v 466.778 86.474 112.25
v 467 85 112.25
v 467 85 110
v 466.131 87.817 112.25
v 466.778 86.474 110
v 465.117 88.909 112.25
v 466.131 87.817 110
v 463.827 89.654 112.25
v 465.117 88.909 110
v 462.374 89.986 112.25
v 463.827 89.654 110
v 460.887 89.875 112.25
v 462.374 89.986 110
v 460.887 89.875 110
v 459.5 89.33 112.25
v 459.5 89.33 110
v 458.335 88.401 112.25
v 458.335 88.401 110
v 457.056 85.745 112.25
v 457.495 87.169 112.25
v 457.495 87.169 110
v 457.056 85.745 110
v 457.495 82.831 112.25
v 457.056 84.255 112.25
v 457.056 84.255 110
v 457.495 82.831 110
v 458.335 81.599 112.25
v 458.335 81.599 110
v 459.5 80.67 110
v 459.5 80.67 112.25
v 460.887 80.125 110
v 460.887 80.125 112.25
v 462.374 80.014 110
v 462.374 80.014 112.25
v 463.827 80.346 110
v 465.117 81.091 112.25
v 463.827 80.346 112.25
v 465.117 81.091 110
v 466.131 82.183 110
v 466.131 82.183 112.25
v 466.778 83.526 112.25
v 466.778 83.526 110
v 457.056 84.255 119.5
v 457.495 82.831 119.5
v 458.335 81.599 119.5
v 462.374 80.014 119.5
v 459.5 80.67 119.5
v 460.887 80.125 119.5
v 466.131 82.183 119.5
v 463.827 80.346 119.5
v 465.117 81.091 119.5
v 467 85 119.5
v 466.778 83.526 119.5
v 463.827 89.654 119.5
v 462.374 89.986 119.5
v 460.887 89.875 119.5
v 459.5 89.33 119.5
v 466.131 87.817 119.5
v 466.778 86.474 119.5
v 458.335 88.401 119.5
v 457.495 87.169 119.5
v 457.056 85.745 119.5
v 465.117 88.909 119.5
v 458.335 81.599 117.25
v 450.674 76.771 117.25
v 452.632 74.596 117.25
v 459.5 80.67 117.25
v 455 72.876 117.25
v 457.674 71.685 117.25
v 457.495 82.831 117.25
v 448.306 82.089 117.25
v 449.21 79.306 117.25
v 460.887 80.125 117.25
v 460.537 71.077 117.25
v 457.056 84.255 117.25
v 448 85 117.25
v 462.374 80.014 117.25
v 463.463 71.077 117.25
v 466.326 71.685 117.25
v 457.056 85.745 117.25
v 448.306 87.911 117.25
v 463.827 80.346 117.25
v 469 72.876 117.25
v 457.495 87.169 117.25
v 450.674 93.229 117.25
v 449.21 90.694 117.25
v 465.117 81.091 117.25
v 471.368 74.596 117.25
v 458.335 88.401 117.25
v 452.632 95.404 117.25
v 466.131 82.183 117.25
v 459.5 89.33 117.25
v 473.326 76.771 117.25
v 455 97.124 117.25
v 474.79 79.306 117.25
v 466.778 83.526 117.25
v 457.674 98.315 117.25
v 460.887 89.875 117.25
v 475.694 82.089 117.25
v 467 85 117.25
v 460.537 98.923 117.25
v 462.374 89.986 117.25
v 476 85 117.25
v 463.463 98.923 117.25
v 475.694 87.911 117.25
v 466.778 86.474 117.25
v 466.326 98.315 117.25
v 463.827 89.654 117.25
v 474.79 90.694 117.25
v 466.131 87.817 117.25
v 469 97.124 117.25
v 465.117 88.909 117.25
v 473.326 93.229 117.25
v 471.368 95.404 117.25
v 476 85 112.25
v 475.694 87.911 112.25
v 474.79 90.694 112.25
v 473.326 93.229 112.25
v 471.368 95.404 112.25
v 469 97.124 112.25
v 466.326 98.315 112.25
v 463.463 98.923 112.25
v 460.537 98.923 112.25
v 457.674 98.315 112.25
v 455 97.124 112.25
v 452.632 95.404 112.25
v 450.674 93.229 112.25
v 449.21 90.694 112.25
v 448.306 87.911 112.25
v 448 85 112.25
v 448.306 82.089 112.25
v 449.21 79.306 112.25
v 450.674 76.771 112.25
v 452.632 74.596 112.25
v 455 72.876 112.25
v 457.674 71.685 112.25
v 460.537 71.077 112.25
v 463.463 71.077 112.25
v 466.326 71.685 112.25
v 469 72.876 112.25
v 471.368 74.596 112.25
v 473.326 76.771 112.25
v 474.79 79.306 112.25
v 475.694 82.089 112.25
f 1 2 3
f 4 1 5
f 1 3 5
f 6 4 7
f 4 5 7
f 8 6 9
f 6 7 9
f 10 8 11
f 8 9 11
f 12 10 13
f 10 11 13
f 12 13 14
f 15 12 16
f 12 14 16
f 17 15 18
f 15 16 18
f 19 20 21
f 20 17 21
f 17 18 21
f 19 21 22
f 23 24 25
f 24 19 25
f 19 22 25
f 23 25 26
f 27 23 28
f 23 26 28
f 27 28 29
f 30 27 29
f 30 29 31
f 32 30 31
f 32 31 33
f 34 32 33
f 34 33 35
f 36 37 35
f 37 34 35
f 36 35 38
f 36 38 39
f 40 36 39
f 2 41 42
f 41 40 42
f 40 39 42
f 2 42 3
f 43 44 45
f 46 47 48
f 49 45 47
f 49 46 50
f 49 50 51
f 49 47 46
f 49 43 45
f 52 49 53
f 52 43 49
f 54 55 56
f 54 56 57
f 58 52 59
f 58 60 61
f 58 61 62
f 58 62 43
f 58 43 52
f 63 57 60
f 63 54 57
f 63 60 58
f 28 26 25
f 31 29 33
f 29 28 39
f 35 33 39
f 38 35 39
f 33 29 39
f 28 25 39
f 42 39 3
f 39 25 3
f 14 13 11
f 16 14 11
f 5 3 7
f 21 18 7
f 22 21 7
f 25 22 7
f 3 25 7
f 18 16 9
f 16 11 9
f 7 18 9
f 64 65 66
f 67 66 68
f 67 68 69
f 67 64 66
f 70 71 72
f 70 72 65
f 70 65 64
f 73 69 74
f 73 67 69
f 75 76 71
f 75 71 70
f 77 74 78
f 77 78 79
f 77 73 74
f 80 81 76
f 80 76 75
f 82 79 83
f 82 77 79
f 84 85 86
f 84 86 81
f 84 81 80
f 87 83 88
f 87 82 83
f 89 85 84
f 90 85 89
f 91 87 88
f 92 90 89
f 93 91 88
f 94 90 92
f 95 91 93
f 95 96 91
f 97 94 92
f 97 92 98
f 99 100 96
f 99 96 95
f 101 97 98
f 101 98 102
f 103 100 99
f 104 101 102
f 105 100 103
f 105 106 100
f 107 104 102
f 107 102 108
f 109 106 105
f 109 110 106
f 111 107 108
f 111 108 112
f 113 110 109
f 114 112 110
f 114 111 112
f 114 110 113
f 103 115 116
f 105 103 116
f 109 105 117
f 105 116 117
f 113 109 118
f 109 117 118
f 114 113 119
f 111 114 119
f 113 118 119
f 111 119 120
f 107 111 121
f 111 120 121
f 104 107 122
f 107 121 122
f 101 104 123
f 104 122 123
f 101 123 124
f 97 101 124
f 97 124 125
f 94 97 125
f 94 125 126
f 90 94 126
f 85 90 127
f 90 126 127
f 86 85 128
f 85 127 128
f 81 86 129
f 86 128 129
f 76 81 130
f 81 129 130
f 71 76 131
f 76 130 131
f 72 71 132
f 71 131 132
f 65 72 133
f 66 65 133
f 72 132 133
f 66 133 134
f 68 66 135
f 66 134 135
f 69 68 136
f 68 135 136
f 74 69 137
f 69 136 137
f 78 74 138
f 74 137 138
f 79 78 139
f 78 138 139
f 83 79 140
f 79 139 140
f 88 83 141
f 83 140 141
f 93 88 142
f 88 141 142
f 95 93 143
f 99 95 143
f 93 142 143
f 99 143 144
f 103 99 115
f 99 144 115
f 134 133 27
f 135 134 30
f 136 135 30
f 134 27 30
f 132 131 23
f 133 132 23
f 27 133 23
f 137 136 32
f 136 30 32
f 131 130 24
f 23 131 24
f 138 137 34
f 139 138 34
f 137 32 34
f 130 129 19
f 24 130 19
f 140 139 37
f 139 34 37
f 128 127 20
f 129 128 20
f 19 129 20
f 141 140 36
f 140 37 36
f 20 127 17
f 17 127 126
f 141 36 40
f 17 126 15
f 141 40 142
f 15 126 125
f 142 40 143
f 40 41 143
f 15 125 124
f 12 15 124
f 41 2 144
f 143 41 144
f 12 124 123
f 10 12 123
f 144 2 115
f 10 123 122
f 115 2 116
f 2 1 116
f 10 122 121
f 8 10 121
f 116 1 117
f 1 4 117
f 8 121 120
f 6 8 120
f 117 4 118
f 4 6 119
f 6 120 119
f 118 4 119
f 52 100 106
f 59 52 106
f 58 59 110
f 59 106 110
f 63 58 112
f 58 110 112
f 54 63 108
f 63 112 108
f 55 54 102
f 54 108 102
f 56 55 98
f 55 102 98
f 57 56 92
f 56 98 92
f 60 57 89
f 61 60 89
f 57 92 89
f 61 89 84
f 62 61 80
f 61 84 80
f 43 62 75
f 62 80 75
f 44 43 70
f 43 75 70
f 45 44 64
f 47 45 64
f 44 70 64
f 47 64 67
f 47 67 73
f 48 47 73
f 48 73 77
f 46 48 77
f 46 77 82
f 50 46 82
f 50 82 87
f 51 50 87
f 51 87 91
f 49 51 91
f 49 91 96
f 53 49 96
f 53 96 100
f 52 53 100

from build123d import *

# Parameters (mm, degrees)
CYLINDER1201_R     = 5
CYLINDER1201_DEPTH = 9.5
CYLINDER1197_R     = 14
CYLINDER1197_DEPTH = 5


with BuildPart() as cylinder1201:
    # Cylinder1201 → Cylinder1201 (new body)
    with BuildSketch(Plane(origin=(462, 85, 142.75), x_dir=(1, 0, 0), z_dir=(0, 0, 1))):
        Circle(CYLINDER1201_R)
    extrude(amount=CYLINDER1201_DEPTH)


with BuildPart() as fusion248002050124:
    # Cylinder1197 → Cylinder1197 (new body)
    with BuildSketch(Plane(origin=(462, 85, 145), x_dir=(1, 0, 0), z_dir=(0, 0, 1))):
        Circle(CYLINDER1197_R)
    extrude(amount=CYLINDER1197_DEPTH)

    # Fusion248002050124: union Cylinder1201
    add(cylinder1201.part)


with BuildPart() as fusion248002050124_1:
    # Fusion248002050124 placement: moved
    add(fusion248002050124.part.moved(Location((0, 0, -32.75))))


solid = fusion248002050124_1.part
